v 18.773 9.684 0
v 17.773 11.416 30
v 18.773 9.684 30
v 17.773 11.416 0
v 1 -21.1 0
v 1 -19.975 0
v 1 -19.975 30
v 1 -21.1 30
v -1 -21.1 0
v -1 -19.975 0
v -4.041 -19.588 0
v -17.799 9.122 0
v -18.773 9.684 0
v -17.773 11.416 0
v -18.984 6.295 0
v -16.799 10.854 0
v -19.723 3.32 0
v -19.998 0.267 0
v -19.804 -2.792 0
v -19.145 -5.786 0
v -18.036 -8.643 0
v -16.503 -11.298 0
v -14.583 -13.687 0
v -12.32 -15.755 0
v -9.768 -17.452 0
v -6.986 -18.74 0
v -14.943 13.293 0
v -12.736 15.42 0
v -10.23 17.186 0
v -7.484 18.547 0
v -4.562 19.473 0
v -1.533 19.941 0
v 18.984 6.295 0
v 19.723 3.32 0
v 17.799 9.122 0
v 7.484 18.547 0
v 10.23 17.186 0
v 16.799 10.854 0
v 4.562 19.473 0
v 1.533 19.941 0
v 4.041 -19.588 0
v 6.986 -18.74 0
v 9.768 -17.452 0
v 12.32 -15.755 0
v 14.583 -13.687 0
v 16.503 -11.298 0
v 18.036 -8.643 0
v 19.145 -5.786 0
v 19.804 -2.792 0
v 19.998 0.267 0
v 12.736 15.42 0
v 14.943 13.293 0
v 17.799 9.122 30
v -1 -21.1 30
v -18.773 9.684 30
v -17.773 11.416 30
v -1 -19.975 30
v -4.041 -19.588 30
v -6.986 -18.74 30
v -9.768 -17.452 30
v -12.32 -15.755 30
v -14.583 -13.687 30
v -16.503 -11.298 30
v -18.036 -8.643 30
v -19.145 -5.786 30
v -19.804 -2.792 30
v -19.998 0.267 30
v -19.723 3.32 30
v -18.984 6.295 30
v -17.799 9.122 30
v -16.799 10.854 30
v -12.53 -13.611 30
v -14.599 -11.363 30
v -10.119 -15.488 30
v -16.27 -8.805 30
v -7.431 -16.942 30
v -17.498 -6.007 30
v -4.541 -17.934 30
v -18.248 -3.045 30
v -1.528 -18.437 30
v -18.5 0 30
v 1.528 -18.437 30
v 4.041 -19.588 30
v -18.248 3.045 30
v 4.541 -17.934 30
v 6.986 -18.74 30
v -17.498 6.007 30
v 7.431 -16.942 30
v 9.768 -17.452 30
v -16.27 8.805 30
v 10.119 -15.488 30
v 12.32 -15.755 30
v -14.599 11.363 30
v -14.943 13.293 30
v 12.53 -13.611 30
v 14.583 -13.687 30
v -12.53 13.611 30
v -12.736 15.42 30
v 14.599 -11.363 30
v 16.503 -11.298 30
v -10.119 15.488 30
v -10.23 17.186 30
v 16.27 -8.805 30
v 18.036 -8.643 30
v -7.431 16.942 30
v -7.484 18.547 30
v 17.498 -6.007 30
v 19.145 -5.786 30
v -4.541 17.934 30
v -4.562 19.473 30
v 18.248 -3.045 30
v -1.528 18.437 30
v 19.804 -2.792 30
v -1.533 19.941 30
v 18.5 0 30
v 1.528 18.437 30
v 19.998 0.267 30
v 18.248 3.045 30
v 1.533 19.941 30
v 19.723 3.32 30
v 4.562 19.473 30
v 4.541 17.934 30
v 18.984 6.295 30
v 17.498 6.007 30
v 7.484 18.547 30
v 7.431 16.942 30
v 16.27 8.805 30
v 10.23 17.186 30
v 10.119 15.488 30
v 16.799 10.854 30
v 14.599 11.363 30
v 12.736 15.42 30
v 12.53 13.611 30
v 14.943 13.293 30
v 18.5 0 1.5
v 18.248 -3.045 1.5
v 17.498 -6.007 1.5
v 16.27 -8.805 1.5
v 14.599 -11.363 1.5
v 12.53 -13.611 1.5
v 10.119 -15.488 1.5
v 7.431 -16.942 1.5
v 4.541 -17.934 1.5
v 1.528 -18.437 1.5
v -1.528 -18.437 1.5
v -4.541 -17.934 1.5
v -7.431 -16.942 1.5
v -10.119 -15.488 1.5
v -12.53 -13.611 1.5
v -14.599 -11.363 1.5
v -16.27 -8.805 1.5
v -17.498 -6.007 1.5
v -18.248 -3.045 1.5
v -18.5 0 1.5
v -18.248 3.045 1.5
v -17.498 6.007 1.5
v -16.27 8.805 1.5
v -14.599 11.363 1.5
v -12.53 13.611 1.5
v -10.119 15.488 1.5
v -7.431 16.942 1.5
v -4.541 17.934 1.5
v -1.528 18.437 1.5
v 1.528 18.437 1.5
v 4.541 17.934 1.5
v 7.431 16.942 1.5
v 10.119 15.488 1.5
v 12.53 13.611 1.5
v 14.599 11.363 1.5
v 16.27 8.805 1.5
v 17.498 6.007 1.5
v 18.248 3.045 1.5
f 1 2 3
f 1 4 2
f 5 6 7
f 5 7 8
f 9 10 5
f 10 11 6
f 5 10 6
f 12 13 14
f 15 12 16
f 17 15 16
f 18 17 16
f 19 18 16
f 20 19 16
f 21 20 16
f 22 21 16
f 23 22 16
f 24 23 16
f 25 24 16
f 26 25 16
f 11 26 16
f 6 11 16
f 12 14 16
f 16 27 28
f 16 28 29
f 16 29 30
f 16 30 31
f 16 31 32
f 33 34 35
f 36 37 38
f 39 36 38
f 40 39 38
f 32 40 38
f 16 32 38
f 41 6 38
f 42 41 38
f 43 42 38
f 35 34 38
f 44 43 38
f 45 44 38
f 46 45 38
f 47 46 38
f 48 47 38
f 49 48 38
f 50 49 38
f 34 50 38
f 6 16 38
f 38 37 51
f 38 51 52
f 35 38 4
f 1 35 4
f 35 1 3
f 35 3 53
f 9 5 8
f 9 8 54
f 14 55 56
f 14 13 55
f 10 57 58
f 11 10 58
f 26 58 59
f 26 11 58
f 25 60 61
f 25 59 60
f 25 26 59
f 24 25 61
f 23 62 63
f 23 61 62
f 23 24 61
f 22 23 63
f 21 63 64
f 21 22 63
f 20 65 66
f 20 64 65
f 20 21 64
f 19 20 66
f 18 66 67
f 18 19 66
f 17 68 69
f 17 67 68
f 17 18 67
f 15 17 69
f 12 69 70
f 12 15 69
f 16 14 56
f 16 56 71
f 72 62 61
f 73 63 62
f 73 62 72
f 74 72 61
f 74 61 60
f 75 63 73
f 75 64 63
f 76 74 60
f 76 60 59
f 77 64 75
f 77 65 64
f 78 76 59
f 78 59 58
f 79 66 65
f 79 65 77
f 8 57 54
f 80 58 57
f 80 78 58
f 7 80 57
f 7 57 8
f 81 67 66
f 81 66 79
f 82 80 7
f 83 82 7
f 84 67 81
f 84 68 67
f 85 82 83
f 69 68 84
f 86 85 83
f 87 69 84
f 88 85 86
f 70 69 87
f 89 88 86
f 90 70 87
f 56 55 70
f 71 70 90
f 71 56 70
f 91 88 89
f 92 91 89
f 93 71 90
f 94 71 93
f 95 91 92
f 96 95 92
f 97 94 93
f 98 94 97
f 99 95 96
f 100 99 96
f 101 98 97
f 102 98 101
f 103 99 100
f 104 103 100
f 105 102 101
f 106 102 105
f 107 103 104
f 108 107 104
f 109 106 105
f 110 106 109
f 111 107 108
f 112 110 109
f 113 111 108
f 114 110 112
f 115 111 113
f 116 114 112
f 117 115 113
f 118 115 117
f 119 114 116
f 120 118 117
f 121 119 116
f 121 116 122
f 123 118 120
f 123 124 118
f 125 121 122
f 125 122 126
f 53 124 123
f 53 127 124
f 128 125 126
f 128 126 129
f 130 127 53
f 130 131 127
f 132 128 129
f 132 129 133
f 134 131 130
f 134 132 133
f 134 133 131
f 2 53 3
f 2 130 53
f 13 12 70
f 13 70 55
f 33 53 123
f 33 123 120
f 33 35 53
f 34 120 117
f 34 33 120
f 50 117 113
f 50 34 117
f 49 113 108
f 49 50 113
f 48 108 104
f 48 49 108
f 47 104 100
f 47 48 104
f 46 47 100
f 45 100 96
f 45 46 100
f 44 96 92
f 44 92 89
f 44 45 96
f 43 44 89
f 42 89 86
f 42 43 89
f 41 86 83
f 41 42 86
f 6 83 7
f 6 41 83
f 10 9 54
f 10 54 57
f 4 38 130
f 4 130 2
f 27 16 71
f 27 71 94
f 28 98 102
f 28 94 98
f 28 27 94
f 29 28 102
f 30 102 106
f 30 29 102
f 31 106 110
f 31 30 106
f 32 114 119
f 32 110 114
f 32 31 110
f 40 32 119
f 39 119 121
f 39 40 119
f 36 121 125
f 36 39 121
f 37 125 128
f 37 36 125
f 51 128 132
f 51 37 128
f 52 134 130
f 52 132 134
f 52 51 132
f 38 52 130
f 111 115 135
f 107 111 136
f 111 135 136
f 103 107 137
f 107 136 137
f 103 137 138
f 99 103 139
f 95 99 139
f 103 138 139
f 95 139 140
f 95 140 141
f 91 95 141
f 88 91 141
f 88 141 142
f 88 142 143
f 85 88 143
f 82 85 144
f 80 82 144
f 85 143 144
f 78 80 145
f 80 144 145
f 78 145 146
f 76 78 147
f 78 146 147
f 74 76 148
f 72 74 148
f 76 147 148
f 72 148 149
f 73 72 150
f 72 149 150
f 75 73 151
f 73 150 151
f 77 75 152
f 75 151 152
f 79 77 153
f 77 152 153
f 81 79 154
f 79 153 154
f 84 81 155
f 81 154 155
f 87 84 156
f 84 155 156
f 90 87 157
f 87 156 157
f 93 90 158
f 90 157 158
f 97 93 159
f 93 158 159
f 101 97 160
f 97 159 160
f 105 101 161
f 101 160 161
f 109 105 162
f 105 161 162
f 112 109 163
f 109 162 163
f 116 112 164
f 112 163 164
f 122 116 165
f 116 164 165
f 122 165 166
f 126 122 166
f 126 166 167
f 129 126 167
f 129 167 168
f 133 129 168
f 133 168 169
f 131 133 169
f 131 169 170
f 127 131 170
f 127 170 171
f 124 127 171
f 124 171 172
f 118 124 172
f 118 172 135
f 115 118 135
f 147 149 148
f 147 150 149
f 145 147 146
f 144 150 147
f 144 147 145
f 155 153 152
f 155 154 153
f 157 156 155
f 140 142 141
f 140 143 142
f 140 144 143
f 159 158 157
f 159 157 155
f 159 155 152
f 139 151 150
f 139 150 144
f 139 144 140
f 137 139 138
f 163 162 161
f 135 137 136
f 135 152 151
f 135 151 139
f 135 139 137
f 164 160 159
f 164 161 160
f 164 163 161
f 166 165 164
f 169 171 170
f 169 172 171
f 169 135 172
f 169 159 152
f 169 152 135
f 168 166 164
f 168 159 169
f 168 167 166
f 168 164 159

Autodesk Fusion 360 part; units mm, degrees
sketch "Sketch1" plane through (0, 0, 0) normal (0, 0, 1) x (1, 0, 0)
  circle A0 centre (0, 0) radius 20
  line L0 (1, -19.975) -> (1, -21.1)
  line L1 (1, -21.1) -> (-1, -21.1)
  line L2 (-1, -21.1) -> (-1, -19.975)
  line L3 (18.7731, 9.684) -> (17.7988, 9.1215)
  line L4 (17.7731, 11.416) -> (18.7731, 9.684)
  line L5 (16.7988, 10.8535) -> (17.7731, 11.416)
  line L6 (-17.7731, 11.416) -> (-16.7988, 10.8535)
  line L7 (-18.7731, 9.684) -> (-17.7731, 11.416)
  line L8 (-17.7988, 9.1215) -> (-18.7731, 9.684)
  dimension "d5" = 40
  dimension "d9" = 2
  dimension "d12" = 360
extrude "Extrude2" add sketch "Sketch1" along normal blind 30 contours A0
shell "Shell2" thickness 1.5 removed faces 1 at (-4.9181, 4.3771, 30)
extrude "Extrude3" add sketch "Sketch1" along normal up to surface (30 mm away) contours A0 L3 L4 L5 | A0 L0 L1 L2 | A0 L6 L7 L8
